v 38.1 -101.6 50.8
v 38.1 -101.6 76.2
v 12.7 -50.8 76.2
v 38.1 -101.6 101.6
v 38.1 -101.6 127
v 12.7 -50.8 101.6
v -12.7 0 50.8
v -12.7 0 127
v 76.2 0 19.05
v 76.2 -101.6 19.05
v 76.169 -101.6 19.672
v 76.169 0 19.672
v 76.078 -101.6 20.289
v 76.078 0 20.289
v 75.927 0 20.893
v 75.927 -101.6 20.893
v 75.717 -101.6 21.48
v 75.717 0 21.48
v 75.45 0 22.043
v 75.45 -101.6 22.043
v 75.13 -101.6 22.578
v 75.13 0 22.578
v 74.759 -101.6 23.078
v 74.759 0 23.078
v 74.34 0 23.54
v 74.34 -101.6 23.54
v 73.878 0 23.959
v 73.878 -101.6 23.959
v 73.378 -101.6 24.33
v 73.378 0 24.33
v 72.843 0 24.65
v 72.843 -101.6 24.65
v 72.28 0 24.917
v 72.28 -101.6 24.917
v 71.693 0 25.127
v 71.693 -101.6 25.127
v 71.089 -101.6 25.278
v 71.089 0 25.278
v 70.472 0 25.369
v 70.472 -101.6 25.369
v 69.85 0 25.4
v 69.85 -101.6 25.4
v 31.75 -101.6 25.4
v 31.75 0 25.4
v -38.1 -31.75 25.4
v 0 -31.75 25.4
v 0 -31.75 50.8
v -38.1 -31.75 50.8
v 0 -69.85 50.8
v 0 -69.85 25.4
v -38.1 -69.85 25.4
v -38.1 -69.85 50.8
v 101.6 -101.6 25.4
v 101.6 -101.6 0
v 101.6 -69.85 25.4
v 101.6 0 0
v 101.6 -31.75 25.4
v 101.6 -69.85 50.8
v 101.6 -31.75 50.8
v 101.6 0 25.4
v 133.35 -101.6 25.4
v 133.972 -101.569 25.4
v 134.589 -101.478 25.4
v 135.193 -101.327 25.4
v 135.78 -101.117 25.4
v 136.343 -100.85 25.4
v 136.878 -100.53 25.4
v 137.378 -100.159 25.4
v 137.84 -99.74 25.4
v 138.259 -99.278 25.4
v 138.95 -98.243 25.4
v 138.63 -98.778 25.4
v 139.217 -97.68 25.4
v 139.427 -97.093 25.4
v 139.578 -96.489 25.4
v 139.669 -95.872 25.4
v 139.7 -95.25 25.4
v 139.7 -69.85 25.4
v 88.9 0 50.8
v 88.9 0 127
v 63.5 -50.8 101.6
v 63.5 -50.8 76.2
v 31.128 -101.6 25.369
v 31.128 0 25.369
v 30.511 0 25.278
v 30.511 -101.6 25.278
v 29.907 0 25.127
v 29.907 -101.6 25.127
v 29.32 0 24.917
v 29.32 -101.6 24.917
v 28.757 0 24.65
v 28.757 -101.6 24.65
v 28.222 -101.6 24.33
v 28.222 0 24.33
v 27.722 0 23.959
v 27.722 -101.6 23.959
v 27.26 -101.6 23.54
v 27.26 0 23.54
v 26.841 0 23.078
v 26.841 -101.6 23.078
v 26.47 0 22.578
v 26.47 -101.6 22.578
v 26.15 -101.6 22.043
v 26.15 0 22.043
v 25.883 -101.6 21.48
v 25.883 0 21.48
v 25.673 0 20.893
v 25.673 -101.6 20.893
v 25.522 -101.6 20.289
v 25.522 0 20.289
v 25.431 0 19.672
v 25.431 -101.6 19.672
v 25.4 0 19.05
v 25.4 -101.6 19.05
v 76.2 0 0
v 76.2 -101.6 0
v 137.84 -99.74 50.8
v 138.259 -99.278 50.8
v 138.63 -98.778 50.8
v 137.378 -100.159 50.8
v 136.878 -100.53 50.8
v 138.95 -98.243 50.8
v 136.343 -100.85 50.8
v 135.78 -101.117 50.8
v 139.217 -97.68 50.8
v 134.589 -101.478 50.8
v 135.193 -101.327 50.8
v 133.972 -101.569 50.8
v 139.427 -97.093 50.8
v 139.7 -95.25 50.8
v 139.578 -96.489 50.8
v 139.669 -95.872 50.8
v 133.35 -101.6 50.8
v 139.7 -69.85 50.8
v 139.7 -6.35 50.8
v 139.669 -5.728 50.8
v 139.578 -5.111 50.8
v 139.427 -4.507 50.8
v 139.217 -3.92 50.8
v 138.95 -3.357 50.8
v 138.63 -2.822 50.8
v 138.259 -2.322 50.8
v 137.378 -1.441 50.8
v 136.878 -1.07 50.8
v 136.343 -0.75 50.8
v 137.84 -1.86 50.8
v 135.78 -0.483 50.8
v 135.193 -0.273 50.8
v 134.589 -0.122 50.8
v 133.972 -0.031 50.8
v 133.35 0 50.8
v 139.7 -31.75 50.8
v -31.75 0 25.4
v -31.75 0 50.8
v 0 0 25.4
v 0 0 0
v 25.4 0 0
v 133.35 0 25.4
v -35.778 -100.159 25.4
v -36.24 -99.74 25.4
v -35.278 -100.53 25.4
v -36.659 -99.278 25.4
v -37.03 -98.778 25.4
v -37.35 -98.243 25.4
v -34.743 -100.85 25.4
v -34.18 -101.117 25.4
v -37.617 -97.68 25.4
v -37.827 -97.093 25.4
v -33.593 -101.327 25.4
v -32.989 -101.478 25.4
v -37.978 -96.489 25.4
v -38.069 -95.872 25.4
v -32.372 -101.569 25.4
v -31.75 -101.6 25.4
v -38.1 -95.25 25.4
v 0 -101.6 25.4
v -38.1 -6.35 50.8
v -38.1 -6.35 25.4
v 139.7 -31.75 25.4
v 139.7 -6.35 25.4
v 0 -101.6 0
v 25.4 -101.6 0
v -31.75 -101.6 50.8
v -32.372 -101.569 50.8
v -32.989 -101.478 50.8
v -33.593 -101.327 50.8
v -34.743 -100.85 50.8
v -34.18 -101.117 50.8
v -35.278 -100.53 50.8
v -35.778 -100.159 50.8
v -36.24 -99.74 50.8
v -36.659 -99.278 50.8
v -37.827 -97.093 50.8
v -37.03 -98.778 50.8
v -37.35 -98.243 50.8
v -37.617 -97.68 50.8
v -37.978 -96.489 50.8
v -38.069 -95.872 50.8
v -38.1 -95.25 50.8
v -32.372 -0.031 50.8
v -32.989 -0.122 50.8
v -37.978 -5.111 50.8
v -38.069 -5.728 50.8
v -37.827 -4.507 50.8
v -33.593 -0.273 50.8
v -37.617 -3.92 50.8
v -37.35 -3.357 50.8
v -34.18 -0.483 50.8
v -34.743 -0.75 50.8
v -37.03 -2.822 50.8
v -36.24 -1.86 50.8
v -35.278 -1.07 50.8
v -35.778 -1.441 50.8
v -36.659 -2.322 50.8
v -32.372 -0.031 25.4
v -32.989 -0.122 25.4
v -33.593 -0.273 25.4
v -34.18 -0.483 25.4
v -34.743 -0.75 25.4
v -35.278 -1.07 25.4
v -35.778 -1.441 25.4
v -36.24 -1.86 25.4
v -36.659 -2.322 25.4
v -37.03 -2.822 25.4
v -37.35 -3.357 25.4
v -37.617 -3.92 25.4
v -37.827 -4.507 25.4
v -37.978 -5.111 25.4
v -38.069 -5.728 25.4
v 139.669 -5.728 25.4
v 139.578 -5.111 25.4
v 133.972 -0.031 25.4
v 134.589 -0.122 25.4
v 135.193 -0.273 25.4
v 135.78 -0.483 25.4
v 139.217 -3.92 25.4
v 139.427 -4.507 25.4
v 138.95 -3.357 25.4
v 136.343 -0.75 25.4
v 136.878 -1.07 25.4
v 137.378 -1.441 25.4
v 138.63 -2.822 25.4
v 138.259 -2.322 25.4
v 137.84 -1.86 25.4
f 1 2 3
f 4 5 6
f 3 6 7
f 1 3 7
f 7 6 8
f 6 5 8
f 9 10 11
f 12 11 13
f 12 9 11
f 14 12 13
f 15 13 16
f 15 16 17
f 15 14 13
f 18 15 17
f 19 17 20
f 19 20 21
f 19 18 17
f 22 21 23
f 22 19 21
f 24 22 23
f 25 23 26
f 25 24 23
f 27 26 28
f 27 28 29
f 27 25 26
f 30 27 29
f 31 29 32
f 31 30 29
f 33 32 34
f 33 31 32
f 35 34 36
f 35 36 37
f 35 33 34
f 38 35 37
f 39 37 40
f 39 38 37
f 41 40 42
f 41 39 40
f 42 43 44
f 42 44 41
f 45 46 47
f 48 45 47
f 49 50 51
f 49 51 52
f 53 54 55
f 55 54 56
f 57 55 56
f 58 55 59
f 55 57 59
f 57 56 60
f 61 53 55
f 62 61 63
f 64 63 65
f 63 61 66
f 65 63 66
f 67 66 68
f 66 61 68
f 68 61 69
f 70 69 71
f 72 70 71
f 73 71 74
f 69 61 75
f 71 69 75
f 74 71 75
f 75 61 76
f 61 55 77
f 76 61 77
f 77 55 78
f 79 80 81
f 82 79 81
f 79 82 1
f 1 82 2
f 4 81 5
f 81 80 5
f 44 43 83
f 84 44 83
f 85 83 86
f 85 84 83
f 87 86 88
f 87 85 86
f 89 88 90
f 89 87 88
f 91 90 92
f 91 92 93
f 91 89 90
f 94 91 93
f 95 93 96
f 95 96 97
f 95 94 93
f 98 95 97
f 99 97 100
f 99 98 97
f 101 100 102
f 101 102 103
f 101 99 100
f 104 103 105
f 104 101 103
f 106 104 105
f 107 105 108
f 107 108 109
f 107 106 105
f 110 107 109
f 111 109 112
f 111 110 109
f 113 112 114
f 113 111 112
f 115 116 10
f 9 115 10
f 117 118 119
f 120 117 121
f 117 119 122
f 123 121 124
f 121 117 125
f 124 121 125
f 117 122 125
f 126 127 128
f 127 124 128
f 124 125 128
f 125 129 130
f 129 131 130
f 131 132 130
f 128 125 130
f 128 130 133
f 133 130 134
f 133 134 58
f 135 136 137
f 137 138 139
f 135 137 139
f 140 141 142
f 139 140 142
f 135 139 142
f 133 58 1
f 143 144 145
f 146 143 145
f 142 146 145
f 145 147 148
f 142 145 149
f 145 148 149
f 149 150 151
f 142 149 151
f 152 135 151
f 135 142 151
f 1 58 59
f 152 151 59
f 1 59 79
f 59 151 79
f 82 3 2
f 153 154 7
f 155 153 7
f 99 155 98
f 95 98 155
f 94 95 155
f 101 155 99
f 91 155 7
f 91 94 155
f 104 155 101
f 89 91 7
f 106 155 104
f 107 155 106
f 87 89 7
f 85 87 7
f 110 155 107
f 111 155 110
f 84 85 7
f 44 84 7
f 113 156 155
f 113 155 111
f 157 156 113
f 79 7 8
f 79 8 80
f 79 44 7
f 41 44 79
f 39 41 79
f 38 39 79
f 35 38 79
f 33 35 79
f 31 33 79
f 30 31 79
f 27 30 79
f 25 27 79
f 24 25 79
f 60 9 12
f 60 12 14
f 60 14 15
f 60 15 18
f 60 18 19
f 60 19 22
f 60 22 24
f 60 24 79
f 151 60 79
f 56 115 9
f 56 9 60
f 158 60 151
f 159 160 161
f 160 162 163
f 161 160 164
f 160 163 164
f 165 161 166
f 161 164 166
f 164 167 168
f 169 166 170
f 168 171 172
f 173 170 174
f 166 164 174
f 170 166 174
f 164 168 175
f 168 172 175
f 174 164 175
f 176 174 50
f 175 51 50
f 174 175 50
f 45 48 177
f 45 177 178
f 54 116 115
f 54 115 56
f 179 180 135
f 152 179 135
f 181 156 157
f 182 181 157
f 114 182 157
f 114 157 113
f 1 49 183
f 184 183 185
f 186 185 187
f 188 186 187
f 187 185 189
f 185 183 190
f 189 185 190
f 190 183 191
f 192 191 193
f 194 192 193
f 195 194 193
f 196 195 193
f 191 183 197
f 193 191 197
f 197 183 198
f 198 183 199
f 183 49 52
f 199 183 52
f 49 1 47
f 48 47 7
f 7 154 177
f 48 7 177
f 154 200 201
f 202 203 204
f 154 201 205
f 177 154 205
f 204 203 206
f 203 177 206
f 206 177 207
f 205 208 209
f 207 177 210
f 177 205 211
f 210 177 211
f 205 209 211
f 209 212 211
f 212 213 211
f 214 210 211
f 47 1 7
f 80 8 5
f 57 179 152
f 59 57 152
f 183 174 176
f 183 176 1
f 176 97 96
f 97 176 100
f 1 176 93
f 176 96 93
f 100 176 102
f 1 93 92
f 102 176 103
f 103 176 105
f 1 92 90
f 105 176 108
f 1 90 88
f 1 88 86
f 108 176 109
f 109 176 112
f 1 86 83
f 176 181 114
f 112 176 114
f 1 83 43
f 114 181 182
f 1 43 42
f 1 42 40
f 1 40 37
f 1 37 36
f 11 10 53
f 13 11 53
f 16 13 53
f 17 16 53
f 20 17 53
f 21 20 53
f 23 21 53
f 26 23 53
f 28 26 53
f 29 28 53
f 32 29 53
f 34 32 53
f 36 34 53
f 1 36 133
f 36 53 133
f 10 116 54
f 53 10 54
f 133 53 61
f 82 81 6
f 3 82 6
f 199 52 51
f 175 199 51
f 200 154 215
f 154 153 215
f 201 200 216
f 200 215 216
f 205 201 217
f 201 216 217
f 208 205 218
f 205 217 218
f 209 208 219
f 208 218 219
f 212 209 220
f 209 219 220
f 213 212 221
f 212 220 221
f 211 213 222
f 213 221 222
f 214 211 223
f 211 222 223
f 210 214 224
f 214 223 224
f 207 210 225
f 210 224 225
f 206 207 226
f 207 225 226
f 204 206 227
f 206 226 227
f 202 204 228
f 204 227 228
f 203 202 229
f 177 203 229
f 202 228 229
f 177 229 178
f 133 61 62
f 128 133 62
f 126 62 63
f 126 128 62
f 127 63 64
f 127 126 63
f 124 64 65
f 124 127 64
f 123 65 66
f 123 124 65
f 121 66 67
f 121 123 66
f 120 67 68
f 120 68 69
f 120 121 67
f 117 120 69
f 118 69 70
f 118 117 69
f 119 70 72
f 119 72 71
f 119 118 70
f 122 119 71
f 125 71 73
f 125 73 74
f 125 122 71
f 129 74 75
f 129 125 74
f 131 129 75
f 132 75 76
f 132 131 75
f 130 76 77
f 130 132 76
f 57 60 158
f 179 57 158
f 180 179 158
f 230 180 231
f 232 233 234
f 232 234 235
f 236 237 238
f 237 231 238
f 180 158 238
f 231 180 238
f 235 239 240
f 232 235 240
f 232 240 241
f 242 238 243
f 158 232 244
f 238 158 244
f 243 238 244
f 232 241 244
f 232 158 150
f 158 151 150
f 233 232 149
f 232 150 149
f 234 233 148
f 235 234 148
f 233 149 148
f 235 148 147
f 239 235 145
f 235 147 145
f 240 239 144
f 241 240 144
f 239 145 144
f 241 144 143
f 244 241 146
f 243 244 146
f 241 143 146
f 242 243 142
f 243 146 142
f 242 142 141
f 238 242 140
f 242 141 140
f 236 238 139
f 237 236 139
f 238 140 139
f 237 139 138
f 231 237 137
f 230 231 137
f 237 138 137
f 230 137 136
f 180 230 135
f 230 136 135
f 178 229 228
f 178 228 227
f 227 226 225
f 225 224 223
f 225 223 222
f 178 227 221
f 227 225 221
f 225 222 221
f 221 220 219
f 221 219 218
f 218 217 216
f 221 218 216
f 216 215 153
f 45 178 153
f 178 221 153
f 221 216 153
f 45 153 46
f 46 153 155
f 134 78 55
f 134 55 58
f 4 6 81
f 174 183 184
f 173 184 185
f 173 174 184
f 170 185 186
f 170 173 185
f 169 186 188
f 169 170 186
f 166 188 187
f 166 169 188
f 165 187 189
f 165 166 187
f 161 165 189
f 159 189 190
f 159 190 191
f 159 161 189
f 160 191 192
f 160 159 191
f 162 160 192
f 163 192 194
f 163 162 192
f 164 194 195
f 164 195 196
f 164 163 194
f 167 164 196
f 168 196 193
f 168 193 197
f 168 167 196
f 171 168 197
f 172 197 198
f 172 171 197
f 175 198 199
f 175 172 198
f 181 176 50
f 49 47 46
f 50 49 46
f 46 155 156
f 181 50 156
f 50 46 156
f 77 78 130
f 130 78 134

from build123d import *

# Parameters (mm, degrees)
F1_DEPTH  = 101.6
F2_W      = 38.1
F2_H      = 25.4
F3_DEPTH  = 38.1
F4_W      = 38.1
F4_H      = 25.4
F5_DEPTH  = 38.1
F6_R      = 6.35
F7_W      = 50.8
F7_H      = 25.4
F8_DEPTH  = 101.601
F9_R      = 6.35
F10_W     = 101.6
F10_H     = 101.6
F11_DEPTH = 76.2
F13_DEPTH = 76.2
F15_START = -25.4
F15_DEPTH = 25.4


with BuildPart() as f1:
    # F0 (on Front) → F1 (new body)
    with BuildSketch(Plane.XZ):
        Polygon((0, 25.4), (0, 0), (101.6, 0), (101.6, 25.4), (139.7, 25.4), (139.7, 50.8), (-38.1, 50.8), (-38.1, 25.4), align=None)
    extrude(amount=F1_DEPTH)

    # F2 (on face) → F3 (cut)
    with BuildSketch(Plane.YZ.offset(139.7)):
        with Locations((-50.8, 38.1)):
            Rectangle(F2_W, F2_H)
    extrude(amount=-F3_DEPTH, mode=Mode.SUBTRACT)

    # F4 (on face) → F5 (cut)
    with BuildSketch(Plane(origin=(-38.1, 0, 0), x_dir=(0, -1, 0), z_dir=(-1, 0, 0))):
        with Locations((50.8, 38.1)):
            Rectangle(F4_W, F4_H)
    extrude(amount=-F5_DEPTH, mode=Mode.SUBTRACT)

    # F6
    f6_edges = [f1.edges().sort_by_distance(p)[0] for p in [
        (139.7, -101.6, 38.1),
        (139.7, 0, 38.1),
        (-38.1, -101.6, 38.1),
        (-38.1, 0, 38.1),
    ]]
    fillet(f6_edges, radius=F6_R)

    # F7 (on face) → F8 (cut, through all)
    with BuildSketch(Plane.XZ.offset(101.6)):
        with Locations((50.8, 12.7)):
            Rectangle(F7_W, F7_H)
    extrude(amount=-F8_DEPTH, mode=Mode.SUBTRACT)

    # F9
    f9_edges = [f1.edges().sort_by_distance(p)[0] for p in [
        (25.4, -50.8, 25.4),
        (76.2, -50.8, 25.4),
    ]]
    fillet(f9_edges, radius=F9_R)

    # F10 (on face) → F11 (join)
    with BuildSketch(Plane.XY.offset(50.8)):
        with Locations((38.1, -50.8)):
            Rectangle(F10_W, F10_H)
    extrude(amount=F11_DEPTH)

    # F12 (on face) → F13 (cut)
    with BuildSketch(Plane.XY.offset(127)):
        Polygon((88.9, 0), (38.1, -101.6), (88.9, -101.6), align=None)
        Polygon((38.1, -101.6), (-12.7, 0), (-12.7, -101.6), align=None)
    extrude(amount=-F13_DEPTH, mode=Mode.SUBTRACT)

    # F14 (on face) → F15 (cut)
    with BuildSketch(Plane.XY.offset(127).offset(F15_START)):
        Polygon((63.5, -50.8), (12.7, -50.8), (38.1, -101.6), align=None)
    extrude(amount=-F15_DEPTH, mode=Mode.SUBTRACT)


solid = f1.part
